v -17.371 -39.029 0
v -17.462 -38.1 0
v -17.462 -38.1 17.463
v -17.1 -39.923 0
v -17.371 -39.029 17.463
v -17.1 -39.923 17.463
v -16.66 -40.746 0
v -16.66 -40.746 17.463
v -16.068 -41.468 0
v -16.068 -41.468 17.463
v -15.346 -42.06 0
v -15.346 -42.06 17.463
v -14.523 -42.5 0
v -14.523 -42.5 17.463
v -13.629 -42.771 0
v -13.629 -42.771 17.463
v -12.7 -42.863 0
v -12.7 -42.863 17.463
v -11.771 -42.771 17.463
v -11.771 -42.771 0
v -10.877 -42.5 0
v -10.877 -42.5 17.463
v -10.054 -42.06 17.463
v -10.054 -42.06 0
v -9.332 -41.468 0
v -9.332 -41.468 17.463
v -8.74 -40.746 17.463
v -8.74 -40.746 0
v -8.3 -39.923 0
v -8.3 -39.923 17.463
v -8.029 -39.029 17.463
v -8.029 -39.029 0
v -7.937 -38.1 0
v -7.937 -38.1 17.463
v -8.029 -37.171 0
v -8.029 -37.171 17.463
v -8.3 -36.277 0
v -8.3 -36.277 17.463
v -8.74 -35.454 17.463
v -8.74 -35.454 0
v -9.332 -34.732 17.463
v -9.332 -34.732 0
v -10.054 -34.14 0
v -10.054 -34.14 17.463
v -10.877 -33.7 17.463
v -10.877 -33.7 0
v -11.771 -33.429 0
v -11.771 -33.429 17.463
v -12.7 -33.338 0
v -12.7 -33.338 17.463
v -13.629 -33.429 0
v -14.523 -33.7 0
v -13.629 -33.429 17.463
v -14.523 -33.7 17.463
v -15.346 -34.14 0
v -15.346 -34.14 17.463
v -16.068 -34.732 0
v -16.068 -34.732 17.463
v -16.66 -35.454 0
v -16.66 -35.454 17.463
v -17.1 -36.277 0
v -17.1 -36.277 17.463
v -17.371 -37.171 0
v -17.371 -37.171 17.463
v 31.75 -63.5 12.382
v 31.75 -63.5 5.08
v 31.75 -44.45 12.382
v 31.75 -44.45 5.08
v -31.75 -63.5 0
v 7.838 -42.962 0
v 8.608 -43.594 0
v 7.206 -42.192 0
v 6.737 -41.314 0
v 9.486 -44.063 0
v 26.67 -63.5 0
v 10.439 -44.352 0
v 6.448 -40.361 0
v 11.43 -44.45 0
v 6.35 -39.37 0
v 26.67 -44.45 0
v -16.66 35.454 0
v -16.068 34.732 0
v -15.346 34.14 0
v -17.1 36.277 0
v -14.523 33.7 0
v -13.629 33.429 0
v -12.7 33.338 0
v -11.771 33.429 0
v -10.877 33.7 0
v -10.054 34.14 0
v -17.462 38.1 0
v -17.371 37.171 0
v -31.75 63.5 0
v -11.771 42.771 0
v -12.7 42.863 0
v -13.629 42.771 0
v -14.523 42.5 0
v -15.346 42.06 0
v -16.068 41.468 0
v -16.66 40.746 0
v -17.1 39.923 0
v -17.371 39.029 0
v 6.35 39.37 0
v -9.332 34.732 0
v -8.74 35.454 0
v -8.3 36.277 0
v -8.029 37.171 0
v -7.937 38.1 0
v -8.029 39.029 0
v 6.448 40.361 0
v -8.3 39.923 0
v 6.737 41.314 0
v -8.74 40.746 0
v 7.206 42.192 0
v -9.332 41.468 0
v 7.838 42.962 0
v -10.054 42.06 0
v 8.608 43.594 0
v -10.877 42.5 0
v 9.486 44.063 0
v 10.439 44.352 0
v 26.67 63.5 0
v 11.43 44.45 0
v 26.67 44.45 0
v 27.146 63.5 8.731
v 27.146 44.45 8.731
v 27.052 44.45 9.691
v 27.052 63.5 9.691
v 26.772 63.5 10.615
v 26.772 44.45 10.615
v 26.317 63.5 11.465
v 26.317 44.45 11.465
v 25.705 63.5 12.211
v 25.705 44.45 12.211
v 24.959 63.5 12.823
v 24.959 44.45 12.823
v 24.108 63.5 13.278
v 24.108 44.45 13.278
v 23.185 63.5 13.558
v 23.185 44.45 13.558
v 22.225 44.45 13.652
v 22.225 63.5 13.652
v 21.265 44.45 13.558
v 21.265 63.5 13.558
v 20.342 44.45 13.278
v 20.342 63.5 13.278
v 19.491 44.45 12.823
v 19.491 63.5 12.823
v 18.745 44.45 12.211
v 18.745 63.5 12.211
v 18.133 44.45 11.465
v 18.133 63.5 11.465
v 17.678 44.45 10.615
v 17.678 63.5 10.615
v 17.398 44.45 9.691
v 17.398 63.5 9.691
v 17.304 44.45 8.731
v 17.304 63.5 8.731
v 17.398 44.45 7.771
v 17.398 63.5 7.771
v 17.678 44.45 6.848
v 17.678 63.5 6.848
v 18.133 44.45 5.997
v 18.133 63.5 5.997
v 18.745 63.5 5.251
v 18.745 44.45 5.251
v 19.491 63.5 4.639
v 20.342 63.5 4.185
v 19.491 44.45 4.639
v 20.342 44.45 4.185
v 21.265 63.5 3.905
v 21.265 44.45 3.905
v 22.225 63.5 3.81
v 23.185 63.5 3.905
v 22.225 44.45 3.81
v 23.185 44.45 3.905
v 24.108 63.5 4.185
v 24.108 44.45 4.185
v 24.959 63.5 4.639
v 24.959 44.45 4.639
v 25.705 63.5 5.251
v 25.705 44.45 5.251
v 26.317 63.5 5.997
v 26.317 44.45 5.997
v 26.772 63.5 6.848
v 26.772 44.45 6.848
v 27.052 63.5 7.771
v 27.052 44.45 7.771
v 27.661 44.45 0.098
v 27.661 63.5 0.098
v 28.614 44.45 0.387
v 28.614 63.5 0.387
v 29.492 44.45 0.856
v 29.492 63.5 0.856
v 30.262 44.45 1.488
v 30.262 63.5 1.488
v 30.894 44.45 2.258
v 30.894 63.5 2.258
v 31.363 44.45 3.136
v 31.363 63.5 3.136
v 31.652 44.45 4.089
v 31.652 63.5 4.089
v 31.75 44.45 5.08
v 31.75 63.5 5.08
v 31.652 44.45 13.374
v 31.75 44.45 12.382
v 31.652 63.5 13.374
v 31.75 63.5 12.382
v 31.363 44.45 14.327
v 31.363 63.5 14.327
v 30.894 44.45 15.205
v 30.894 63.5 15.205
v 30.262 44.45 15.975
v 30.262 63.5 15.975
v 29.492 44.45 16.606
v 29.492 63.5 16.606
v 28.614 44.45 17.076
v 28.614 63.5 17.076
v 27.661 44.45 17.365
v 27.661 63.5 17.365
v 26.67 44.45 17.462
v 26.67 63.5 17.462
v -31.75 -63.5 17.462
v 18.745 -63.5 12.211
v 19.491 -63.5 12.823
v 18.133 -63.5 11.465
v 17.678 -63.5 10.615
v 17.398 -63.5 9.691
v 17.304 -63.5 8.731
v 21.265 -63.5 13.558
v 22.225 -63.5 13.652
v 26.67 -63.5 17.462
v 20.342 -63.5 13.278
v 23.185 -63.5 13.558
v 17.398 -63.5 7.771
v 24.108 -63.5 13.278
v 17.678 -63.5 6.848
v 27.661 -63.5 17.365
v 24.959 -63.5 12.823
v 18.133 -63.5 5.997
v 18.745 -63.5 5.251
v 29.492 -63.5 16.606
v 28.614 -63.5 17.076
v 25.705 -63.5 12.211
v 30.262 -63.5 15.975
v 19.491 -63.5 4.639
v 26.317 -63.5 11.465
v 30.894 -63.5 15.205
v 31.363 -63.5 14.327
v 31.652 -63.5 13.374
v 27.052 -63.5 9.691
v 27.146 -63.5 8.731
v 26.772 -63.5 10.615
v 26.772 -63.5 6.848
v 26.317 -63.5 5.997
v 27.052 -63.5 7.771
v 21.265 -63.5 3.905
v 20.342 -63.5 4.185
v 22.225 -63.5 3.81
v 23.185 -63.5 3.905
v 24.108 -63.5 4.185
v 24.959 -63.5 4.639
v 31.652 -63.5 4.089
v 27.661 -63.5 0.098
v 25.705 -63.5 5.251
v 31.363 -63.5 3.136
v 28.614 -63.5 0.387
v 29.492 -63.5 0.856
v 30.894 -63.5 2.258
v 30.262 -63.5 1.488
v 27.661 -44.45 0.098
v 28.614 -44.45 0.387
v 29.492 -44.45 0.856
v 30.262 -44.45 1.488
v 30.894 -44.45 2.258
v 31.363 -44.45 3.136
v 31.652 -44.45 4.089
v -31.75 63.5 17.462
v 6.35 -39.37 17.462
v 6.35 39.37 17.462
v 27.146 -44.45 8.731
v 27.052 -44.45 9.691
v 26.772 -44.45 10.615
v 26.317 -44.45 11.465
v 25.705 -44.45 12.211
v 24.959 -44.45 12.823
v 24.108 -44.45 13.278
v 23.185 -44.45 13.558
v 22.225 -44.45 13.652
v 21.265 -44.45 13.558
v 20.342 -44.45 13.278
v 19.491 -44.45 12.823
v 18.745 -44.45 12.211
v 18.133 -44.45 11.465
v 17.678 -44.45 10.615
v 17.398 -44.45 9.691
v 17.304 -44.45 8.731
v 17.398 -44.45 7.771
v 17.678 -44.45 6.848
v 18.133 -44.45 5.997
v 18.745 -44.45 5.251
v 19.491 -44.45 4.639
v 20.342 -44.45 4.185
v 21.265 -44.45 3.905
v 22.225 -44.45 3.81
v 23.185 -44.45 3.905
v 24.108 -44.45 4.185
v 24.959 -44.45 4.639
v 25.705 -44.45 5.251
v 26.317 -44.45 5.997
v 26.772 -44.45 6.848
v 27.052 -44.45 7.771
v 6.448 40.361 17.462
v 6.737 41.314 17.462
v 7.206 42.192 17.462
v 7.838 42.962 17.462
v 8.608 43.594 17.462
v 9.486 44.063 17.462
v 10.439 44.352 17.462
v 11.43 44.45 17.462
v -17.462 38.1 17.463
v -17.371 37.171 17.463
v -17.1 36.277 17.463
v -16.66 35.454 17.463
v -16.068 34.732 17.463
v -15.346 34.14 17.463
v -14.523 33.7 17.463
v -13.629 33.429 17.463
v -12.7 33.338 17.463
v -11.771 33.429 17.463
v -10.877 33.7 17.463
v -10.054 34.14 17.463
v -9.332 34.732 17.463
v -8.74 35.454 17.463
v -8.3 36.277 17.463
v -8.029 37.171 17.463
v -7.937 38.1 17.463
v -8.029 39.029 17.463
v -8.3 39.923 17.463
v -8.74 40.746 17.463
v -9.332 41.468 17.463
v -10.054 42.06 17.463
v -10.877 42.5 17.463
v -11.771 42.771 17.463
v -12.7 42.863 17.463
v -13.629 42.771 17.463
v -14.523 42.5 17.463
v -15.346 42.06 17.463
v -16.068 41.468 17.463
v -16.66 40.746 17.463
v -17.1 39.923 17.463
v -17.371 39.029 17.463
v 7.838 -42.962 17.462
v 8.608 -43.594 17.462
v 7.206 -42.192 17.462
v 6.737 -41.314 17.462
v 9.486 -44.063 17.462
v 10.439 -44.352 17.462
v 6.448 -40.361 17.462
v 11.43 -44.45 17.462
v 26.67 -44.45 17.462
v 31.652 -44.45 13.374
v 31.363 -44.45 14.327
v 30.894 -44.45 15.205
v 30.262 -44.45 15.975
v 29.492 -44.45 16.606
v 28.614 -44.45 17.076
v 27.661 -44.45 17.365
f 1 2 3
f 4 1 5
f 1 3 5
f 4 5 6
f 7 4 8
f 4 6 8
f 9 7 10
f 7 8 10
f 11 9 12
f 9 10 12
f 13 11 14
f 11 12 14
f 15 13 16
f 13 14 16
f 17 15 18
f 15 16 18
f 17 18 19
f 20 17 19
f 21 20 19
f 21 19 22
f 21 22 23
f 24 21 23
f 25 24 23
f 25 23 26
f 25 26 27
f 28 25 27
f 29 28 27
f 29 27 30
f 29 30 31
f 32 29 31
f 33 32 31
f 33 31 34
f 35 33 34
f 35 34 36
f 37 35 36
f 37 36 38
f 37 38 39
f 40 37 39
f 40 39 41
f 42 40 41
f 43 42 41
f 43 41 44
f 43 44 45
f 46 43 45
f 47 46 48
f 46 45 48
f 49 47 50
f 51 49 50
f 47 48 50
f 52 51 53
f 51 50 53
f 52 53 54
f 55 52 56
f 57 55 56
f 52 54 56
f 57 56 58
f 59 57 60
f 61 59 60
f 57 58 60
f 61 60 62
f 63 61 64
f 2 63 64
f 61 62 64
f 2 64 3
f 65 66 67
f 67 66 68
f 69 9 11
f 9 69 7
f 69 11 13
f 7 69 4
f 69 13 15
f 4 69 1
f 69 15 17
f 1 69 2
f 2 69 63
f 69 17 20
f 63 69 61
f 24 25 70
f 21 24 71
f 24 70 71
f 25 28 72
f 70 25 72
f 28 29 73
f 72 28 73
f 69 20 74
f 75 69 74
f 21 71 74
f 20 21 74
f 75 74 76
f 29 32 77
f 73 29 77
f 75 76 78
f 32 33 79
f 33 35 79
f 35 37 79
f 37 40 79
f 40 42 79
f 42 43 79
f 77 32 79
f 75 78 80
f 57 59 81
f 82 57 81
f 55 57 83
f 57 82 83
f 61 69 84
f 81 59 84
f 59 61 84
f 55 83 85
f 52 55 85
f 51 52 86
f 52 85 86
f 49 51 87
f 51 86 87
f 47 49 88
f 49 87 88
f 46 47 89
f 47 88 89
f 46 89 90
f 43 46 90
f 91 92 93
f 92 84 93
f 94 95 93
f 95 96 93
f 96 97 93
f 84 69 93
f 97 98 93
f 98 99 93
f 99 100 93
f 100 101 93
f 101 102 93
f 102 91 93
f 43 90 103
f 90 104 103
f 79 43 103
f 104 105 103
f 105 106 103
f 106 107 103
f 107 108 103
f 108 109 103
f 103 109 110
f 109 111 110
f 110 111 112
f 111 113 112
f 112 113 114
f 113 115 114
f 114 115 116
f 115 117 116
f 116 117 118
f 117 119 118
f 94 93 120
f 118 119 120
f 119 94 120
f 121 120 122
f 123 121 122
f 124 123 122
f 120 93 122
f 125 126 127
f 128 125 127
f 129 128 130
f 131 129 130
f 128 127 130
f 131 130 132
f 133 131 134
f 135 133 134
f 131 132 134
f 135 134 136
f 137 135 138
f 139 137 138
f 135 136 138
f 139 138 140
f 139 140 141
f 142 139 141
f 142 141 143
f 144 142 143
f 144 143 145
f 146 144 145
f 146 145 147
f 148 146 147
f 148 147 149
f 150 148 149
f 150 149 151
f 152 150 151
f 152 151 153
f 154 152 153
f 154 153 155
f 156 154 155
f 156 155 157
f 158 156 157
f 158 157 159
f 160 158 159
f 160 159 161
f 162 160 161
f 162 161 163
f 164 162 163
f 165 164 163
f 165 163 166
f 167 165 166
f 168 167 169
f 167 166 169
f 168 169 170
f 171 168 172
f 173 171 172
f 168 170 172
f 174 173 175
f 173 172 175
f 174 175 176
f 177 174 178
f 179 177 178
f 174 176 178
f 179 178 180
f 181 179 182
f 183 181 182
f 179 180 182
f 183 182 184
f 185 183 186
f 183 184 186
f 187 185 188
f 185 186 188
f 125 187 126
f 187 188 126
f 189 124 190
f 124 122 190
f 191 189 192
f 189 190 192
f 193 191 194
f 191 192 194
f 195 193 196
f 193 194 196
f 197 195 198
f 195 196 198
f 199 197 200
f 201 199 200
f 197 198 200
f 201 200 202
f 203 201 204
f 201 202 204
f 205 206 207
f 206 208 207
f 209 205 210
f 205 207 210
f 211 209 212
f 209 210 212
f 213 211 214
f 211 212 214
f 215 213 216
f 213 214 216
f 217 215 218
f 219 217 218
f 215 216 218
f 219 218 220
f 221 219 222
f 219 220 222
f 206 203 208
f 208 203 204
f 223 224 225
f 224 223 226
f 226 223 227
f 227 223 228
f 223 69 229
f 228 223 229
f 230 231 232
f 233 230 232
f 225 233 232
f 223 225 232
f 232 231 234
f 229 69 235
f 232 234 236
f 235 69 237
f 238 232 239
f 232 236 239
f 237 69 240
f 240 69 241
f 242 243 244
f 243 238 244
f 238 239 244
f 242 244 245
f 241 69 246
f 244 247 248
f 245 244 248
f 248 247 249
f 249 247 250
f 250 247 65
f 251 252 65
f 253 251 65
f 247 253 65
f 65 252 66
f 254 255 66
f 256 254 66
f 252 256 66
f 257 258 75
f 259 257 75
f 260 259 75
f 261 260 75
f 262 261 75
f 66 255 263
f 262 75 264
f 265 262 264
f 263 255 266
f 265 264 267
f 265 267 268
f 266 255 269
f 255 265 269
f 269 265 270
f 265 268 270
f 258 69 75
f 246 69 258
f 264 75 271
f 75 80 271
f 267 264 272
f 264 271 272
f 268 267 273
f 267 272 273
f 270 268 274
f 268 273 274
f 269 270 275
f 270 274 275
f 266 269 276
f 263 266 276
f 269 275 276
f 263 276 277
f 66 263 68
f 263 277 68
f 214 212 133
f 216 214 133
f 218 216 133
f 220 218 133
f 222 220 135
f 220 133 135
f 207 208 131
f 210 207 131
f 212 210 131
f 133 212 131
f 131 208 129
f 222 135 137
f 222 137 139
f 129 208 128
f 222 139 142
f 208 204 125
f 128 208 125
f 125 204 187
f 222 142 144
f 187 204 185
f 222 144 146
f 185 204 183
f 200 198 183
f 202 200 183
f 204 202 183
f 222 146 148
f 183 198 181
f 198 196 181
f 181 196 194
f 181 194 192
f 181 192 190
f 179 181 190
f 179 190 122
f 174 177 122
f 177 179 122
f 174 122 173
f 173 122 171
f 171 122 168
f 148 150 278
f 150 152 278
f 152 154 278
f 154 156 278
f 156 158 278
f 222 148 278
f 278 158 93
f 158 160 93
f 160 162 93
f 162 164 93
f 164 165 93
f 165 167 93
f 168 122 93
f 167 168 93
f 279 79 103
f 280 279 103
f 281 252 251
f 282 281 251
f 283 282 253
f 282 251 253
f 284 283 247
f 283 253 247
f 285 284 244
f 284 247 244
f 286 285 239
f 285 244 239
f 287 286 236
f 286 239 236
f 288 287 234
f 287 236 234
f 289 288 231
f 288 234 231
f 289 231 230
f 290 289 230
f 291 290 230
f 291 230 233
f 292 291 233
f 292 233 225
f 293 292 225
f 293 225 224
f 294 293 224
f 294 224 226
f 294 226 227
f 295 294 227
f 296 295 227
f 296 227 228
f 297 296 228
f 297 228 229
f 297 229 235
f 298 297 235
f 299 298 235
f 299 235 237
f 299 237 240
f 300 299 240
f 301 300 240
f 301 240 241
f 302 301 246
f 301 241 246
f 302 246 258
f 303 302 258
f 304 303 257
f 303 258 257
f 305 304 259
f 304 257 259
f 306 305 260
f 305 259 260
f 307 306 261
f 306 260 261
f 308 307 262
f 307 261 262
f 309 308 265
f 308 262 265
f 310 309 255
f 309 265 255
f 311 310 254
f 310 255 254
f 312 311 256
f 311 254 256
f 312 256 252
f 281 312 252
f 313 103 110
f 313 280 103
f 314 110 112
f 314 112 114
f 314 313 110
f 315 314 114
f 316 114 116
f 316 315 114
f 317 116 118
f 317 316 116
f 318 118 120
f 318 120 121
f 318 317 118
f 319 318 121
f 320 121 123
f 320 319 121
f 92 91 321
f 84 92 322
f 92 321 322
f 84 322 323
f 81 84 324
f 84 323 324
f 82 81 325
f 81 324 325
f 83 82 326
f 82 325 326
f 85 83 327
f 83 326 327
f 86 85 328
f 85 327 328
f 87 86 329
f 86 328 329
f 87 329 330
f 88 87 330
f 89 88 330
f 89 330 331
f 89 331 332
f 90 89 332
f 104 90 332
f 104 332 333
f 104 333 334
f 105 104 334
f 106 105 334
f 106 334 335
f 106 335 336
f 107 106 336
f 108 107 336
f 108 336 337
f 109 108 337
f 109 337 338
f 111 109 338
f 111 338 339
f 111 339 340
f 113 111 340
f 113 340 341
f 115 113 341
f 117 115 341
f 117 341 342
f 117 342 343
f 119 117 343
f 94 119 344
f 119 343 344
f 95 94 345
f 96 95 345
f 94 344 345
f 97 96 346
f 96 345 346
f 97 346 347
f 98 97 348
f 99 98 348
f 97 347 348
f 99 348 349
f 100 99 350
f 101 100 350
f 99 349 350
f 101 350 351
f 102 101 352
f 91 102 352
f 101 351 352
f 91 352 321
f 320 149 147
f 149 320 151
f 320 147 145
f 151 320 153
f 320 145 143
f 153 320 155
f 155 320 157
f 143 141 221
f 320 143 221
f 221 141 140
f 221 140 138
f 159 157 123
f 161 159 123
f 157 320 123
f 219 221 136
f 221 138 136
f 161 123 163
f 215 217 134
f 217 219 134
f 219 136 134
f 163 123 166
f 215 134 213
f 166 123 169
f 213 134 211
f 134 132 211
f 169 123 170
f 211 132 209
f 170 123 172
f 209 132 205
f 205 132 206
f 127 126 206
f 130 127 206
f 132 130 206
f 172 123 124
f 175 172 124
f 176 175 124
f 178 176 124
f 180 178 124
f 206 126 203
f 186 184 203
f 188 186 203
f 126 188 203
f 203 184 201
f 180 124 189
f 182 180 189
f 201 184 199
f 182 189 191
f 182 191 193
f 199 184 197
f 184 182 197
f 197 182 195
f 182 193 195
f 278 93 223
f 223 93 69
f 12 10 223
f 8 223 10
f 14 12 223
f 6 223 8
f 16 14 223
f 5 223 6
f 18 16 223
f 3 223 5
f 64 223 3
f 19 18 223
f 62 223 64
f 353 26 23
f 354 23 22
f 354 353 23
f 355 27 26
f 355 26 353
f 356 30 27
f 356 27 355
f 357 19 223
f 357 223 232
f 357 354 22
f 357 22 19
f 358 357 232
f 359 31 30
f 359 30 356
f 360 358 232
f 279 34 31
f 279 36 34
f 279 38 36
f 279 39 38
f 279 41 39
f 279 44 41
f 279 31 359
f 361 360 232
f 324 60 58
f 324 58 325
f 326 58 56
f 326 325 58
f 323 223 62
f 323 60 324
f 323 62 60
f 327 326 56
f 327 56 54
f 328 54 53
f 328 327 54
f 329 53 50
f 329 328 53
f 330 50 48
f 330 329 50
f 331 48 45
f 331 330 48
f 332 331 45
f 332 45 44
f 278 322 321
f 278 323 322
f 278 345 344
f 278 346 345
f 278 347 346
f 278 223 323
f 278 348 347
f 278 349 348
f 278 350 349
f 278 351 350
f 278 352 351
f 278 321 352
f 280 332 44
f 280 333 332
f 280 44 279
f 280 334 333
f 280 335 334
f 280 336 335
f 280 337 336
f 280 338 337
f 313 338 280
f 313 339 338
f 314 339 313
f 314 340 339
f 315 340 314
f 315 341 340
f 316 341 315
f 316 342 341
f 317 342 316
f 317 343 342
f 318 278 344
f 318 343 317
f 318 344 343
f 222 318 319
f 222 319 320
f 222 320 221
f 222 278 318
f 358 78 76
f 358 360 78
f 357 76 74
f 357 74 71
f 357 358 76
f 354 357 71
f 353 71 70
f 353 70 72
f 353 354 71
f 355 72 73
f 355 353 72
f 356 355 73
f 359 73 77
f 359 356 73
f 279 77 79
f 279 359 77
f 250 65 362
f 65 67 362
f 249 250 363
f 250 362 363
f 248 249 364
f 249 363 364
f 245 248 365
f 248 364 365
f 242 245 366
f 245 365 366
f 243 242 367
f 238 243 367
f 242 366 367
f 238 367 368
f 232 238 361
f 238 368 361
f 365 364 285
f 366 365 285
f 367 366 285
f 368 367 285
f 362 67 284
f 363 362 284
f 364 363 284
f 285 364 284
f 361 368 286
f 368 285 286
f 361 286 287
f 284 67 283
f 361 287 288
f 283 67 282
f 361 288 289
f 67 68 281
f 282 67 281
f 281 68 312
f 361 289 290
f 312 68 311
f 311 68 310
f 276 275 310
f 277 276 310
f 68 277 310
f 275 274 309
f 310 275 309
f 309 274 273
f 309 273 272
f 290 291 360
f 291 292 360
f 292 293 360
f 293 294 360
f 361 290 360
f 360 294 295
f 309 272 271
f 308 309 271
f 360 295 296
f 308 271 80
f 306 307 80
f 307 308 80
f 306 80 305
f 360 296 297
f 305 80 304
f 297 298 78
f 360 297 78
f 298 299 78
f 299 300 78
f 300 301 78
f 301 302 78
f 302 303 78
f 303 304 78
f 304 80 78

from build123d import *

# Parameters (mm, degrees)
F1_DEPTH = 17.4625
F3_D     = 9.8425
F4_R     = 5.08
F6_D     = 9.525
F7_R     = 5.08


with BuildPart() as f1:
    # F0 (on Top) → F1 (new body)
    with BuildSketch(Plane.XY):
        Polygon((-31.75, -63.5), (31.75, -63.5), (31.75, -44.45), (6.35, -44.45), (6.35, 44.45), (31.75, 44.45), (31.75, 63.5), (-31.75, 63.5), align=None)
    extrude(amount=F1_DEPTH)

    # F3 (through all)
    with Locations(Plane(origin=(0, 63.5, 0), x_dir=(-1, 0, 0), z_dir=(0, 1, 0))):
        with Locations((-22.225, 8.73125)):
            Hole(F3_D / 2)

    # F4
    f4_edges = [f1.edges().sort_by_distance(p)[0] for p in [
        (6.35, -44.45, 8.73125),
        (6.35, 44.45, 8.73125),
    ]]
    fillet(f4_edges, radius=F4_R)

    # F6 (through all)
    with Locations(Plane(origin=(0, 0, 0), x_dir=(1, 0, 0), z_dir=(0, 0, -1))):
        with Locations((-12.7, 38.1), (-12.7, -38.1)):
            Hole(F6_D / 2)

    # F7
    f7_edges = [f1.edges().sort_by_distance(p)[0] for p in [
        (31.75, -53.975, 17.4625),
        (31.75, -53.975, 0),
        (31.75, 53.975, 17.4625),
        (31.75, 53.975, 0),
    ]]
    fillet(f7_edges, radius=F7_R)


solid = f1.part
